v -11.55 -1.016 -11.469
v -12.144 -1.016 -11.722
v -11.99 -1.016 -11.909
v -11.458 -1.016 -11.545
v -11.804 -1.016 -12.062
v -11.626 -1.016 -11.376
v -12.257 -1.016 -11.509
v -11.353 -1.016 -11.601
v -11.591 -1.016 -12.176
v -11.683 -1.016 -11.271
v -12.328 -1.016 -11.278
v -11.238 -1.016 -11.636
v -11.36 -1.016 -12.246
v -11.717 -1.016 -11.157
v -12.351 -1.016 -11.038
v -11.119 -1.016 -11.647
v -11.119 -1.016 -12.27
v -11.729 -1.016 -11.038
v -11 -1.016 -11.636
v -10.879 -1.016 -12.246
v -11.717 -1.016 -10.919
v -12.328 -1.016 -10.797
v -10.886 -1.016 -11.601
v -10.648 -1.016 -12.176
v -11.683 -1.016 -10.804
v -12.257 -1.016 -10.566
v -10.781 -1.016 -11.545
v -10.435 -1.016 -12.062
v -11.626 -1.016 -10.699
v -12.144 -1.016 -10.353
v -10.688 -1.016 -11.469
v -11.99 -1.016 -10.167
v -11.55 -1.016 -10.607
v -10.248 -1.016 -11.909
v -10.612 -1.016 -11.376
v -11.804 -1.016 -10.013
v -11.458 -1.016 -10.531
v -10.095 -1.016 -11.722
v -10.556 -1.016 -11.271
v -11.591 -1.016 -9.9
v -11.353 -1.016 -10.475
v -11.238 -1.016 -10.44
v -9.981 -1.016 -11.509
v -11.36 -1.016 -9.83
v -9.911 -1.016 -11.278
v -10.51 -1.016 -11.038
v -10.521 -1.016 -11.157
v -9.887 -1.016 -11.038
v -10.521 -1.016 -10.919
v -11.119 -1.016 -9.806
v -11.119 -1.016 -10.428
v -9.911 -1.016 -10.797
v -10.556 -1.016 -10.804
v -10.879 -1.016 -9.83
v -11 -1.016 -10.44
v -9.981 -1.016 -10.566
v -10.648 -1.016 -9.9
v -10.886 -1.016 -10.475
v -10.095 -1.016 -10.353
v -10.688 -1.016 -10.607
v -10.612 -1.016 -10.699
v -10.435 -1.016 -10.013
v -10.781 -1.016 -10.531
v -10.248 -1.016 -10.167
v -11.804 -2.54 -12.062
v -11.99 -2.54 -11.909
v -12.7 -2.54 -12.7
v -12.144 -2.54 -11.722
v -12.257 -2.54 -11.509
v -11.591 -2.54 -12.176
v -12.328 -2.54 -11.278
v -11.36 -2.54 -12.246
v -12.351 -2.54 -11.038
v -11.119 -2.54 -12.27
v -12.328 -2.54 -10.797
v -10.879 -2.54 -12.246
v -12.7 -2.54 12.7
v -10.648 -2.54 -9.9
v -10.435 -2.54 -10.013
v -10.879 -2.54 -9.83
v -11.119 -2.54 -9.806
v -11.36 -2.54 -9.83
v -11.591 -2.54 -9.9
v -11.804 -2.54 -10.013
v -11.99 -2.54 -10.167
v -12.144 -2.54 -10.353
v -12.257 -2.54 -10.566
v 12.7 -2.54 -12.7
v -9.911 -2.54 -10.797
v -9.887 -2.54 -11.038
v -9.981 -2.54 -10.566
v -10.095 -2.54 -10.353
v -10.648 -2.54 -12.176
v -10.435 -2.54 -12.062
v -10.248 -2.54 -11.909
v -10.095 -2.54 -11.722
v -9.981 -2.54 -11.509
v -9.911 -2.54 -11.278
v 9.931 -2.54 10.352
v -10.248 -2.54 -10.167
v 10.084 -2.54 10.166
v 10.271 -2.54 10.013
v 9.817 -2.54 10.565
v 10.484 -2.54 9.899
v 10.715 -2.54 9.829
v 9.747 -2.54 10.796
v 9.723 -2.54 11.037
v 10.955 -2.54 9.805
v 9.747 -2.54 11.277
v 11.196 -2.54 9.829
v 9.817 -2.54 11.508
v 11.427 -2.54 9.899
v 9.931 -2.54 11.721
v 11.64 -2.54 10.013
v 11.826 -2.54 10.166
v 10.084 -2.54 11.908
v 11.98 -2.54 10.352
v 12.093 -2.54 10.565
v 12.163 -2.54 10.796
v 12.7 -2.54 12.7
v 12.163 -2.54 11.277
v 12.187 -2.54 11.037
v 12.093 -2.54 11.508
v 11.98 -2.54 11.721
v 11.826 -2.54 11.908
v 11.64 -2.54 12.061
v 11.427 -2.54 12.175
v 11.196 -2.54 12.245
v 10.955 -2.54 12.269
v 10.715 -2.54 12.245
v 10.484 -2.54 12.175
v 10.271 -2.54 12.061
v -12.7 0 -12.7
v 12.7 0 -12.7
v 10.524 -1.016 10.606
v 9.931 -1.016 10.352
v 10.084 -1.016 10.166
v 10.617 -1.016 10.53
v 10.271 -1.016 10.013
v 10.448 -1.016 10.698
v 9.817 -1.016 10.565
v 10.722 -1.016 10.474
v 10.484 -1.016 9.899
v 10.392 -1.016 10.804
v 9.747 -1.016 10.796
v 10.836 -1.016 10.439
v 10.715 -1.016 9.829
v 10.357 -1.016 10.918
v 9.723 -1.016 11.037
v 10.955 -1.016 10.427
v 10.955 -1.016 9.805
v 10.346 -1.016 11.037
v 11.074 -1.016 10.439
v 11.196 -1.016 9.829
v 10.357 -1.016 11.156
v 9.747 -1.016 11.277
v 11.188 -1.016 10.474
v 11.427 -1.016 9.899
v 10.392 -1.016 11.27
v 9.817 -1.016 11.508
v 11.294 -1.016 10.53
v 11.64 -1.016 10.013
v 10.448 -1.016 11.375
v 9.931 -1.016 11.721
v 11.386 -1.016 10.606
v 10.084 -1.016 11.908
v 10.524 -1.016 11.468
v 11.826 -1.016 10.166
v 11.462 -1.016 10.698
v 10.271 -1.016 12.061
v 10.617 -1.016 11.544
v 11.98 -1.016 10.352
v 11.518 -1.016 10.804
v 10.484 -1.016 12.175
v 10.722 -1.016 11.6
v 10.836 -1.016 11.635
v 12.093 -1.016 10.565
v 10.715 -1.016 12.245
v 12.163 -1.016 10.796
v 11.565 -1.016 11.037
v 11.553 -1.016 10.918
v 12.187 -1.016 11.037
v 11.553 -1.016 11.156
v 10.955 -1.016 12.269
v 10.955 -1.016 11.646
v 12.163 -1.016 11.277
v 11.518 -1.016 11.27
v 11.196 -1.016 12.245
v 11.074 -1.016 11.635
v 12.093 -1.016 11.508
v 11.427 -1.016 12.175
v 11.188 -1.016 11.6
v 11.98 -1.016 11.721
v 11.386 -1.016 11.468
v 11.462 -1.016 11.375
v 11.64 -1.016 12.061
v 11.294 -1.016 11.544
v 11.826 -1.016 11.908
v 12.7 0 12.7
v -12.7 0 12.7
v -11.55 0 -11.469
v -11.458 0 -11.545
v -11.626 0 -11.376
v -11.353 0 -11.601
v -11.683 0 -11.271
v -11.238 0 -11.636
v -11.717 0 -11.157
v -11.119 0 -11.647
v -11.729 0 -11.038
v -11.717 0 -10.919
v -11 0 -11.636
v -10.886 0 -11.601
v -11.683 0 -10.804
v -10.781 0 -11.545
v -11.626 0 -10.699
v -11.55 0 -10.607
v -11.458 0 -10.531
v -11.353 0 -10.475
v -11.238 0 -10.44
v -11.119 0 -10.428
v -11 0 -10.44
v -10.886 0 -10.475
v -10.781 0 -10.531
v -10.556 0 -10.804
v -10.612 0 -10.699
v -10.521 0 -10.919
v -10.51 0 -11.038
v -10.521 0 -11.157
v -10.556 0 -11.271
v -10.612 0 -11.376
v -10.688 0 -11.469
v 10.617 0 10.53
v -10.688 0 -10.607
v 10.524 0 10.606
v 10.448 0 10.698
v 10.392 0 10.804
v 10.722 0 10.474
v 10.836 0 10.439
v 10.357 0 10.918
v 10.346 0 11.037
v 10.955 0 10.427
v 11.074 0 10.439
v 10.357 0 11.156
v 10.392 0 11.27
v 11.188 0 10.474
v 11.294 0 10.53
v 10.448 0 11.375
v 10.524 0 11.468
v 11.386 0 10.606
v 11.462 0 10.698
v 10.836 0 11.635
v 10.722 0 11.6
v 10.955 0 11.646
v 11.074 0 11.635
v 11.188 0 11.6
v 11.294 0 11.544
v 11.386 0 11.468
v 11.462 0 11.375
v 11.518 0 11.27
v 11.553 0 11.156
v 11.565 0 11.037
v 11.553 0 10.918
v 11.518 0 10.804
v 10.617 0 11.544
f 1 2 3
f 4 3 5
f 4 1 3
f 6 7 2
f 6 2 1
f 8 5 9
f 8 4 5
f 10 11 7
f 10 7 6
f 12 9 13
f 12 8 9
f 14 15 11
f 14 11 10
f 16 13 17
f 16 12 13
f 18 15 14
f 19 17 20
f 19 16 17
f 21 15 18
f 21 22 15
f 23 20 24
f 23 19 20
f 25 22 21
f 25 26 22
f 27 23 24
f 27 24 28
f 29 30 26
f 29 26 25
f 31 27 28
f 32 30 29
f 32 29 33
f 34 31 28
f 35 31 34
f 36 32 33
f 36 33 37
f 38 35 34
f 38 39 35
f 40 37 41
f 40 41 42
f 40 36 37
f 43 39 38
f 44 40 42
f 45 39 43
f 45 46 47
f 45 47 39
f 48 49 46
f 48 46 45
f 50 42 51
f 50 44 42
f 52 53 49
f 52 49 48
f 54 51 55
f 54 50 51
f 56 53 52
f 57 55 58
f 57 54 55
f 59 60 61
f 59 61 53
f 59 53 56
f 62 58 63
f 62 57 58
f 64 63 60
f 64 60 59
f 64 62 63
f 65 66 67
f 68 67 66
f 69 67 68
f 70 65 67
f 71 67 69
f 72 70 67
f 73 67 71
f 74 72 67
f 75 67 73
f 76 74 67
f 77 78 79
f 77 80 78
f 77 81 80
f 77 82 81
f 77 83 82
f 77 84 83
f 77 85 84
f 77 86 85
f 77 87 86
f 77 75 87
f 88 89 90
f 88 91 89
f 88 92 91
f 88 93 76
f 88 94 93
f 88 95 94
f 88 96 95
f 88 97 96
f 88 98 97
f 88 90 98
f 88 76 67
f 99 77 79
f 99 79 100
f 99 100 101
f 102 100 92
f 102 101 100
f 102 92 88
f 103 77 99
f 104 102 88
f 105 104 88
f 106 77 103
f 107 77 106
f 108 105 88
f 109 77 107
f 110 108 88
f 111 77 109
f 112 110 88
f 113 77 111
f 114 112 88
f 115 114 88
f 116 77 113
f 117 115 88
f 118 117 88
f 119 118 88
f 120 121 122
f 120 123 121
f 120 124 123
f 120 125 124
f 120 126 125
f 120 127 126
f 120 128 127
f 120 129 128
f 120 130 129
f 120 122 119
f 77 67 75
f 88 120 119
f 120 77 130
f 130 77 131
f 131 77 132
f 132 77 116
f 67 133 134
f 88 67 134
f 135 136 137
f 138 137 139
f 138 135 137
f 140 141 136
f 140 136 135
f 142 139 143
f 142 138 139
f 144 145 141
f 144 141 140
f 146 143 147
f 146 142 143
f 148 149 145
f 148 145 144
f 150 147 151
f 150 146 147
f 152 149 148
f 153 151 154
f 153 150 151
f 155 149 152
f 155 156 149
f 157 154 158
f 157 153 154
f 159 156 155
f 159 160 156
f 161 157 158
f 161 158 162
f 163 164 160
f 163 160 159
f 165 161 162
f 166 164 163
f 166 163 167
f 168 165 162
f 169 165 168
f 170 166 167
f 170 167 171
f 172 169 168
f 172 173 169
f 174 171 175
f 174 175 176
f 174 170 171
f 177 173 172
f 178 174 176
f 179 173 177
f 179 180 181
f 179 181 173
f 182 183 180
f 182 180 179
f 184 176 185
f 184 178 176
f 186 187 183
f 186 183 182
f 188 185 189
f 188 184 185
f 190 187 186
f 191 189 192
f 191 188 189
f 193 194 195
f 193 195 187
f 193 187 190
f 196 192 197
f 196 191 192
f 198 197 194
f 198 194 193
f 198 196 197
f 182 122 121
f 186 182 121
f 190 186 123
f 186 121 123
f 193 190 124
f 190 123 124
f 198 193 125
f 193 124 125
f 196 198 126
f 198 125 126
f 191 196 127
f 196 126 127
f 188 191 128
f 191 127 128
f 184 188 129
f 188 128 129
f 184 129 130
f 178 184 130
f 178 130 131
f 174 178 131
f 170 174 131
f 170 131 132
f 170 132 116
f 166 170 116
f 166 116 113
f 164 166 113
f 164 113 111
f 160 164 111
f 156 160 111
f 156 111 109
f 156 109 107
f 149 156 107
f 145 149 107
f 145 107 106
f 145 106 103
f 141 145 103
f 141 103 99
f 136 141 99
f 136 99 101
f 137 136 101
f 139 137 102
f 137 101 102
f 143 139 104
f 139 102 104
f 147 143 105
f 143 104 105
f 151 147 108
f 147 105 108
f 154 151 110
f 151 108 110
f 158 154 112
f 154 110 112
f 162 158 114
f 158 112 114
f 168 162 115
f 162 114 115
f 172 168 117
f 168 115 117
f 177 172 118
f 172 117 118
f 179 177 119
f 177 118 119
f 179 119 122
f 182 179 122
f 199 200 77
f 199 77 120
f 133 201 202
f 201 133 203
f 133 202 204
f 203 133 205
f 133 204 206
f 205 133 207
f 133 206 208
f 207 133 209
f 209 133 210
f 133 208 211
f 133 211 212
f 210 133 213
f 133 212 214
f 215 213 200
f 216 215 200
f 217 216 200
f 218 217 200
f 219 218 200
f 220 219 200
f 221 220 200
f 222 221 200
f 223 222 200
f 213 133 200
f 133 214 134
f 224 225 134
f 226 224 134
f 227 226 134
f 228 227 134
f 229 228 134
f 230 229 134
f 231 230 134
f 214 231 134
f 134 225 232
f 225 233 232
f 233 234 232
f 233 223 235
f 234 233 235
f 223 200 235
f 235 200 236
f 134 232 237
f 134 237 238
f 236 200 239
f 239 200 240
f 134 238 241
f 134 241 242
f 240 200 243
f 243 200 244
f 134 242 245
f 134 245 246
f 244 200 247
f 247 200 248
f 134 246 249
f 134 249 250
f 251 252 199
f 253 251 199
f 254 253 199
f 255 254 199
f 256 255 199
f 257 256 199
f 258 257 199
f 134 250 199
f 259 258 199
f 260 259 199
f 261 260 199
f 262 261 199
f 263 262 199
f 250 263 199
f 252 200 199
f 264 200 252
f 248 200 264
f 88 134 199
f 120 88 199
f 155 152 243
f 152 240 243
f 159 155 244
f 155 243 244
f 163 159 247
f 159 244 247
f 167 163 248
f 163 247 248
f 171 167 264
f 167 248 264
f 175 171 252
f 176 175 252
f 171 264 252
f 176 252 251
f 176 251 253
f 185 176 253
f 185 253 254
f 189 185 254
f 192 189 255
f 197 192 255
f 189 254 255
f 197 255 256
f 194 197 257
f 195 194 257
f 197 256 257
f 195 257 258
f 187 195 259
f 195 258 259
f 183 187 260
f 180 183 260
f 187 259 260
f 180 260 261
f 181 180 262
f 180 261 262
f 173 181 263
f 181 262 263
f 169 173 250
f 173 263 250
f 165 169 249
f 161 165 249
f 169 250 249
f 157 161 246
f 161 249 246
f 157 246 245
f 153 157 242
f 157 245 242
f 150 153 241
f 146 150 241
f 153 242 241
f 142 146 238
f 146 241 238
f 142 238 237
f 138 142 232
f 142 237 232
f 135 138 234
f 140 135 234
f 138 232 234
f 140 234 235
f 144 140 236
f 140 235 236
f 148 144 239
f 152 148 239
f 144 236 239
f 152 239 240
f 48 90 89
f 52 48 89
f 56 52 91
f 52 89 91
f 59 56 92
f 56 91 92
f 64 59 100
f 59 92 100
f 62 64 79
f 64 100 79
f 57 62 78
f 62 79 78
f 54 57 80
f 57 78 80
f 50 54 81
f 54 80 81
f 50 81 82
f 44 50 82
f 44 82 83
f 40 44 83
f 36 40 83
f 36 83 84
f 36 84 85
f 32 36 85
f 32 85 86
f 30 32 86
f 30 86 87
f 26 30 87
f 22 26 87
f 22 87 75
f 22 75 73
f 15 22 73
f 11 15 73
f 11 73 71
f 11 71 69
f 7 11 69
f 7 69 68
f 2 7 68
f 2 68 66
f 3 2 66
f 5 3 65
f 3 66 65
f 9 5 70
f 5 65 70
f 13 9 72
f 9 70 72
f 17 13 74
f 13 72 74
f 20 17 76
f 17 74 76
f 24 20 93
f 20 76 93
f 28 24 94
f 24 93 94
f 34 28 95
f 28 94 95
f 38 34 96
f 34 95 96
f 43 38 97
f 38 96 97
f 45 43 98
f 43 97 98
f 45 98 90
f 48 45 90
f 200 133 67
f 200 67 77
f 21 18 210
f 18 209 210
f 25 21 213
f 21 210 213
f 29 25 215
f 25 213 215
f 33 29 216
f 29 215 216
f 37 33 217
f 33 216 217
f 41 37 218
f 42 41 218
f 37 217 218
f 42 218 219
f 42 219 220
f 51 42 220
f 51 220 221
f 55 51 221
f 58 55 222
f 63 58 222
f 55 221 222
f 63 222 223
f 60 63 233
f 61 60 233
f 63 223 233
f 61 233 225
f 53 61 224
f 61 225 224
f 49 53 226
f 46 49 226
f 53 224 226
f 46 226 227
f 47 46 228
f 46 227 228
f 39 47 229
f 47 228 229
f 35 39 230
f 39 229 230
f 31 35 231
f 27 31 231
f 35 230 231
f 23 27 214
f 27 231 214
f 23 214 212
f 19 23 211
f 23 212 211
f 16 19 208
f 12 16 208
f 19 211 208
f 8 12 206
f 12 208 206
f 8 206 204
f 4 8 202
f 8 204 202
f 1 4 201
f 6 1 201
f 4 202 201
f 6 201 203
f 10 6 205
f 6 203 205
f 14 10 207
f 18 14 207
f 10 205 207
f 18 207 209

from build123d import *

# Parameters (mm, degrees)
F0_W           = 25.4
F0_H           = 25.4
F1_DEPTH       = 2.54
F3_D           = 1.2192
F3_CBORE_D     = 2.4638
F3_CBORE_DEPTH = 1.524
F4_D           = 1.2192
F4_CBORE_D     = 2.4638
F4_CBORE_DEPTH = 1.524


with BuildPart() as f1:
    # F0 (on Front) → F1 (new body)
    with BuildSketch(Plane.XZ):
        Rectangle(F0_W, F0_H)
    extrude(amount=F1_DEPTH)

    # F3 (through all)
    with Locations(Plane.XZ.offset(2.54)):
        with Locations((-11.119338, -11.037743)):
            CounterBoreHole(F3_D / 2, F3_CBORE_D / 2, F3_CBORE_DEPTH)

    # F4 (through all)
    with Locations(Plane.XZ.offset(2.54)):
        with Locations((10.955215, 11.03681)):
            CounterBoreHole(F4_D / 2, F4_CBORE_D / 2, F4_CBORE_DEPTH)


solid = f1.part
